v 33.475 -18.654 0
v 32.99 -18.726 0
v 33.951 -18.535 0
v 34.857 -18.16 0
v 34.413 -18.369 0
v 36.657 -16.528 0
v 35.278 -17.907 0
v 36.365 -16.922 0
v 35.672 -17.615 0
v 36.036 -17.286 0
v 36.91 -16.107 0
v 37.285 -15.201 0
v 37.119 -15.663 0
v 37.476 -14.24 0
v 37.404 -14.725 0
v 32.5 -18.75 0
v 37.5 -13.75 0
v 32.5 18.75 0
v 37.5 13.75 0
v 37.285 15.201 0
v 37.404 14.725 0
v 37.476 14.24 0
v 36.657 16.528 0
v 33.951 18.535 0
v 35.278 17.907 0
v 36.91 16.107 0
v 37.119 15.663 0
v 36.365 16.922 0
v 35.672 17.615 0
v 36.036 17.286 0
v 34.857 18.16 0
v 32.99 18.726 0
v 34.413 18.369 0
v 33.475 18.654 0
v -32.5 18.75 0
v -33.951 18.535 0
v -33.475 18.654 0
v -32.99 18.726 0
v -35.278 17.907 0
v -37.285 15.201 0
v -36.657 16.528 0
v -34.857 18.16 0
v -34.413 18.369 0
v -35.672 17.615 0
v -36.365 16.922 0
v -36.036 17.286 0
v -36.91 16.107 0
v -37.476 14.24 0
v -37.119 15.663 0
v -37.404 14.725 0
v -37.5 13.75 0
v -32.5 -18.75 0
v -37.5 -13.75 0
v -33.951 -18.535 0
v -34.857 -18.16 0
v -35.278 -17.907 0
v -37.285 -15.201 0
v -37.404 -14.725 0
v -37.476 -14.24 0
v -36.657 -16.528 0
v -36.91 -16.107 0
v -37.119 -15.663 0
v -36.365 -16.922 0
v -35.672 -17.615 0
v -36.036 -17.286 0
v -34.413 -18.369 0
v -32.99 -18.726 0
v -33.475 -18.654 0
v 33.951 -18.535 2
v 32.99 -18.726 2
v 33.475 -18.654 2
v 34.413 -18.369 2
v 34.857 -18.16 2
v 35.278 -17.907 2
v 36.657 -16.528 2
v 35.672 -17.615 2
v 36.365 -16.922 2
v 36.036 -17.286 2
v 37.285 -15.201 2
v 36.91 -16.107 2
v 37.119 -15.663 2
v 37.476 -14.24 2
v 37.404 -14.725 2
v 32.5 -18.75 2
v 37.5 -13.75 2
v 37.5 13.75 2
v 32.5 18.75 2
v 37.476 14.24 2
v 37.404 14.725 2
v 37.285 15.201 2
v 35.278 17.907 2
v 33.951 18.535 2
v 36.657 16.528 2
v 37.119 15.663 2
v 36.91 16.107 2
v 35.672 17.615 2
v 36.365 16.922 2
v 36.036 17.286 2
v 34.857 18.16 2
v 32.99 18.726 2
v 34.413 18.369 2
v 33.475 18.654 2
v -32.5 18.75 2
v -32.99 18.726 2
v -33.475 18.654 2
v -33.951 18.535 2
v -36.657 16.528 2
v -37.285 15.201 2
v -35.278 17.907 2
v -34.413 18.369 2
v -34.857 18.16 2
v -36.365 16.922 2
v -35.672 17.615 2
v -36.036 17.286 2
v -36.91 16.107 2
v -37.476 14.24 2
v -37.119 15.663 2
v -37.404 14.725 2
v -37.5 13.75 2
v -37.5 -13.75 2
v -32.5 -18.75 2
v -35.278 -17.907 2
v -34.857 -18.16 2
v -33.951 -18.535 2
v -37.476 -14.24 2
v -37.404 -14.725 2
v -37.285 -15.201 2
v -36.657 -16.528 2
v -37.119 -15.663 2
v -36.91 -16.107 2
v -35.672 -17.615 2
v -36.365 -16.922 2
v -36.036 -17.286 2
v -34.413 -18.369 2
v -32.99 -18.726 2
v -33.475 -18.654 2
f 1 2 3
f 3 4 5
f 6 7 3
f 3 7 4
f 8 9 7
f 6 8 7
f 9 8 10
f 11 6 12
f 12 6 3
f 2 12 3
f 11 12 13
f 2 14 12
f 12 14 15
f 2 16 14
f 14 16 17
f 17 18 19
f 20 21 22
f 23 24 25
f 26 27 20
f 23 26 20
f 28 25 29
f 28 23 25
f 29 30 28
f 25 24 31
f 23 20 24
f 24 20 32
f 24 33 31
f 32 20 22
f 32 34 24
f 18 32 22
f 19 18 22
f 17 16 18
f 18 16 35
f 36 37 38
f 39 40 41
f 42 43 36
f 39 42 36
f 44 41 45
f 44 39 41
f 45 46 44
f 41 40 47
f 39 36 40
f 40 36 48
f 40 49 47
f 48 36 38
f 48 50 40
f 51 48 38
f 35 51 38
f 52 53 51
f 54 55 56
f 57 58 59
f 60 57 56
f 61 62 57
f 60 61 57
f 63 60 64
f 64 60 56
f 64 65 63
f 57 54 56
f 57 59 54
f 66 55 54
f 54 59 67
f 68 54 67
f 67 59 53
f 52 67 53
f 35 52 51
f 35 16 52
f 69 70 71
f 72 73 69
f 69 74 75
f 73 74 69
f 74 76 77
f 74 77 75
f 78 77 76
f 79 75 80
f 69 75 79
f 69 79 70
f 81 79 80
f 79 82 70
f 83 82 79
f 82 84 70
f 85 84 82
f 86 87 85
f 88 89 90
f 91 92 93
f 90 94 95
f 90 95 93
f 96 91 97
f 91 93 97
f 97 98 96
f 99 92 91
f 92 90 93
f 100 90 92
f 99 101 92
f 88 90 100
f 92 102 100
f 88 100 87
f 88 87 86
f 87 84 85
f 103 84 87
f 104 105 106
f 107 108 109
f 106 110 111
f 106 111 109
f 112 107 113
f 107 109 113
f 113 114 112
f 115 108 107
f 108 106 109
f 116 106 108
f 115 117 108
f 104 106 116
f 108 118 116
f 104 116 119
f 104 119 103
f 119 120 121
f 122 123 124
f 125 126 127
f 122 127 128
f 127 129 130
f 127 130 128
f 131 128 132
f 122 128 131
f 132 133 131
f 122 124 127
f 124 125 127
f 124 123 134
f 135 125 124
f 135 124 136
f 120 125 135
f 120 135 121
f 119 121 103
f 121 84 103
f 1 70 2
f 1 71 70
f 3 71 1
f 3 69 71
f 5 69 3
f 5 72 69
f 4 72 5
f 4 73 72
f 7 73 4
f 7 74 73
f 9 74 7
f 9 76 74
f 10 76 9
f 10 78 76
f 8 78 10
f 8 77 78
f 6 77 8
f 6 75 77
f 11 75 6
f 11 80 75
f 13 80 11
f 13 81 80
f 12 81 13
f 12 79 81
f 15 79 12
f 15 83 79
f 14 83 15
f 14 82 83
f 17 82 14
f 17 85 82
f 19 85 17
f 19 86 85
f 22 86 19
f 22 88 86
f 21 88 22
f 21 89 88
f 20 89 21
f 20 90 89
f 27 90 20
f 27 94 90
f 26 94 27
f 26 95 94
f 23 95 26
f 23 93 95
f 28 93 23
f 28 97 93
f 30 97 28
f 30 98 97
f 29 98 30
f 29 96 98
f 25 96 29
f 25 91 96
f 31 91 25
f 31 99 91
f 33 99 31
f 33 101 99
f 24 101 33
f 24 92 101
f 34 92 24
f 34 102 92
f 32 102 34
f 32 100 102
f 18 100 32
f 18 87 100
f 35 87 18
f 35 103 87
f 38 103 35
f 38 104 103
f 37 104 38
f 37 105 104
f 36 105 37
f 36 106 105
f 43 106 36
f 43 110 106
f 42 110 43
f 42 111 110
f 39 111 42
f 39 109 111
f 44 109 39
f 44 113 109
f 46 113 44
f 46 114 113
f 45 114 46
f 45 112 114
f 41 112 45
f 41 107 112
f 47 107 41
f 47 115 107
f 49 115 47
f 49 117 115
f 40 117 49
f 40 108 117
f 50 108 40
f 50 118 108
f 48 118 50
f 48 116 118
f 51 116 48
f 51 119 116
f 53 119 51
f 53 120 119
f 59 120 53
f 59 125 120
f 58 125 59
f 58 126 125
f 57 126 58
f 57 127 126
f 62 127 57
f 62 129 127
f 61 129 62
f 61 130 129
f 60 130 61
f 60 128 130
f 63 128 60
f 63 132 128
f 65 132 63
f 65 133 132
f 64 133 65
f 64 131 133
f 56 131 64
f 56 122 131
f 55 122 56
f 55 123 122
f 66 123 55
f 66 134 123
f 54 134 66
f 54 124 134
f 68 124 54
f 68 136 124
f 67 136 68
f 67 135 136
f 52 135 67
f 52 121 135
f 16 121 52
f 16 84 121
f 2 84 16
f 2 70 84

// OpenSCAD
$fn = 64;

// Customizable parameters
width = 75;                 // [25:200] Overall landscape width or portrait height in mm
aspect_ratio = 2;           // [1:0.1:5] Width-to-height ratio
thickness = 2;              // [0.5:0.5:10] Substrate thickness in mm
border_radius = 5;          // [0:0.5:25] Corner radius in mm
orientation = "landscape";  // [landscape, portrait]

function substrate_plate_width(substrate_width, substrate_aspect_ratio, substrate_orientation) =
  substrate_orientation == "portrait"
    ? substrate_width / substrate_aspect_ratio
    : substrate_width;

function substrate_plate_height(substrate_width, substrate_aspect_ratio, substrate_orientation) =
  substrate_orientation == "portrait"
    ? substrate_width
    : substrate_width / substrate_aspect_ratio;

module rounded_rectangle_2d(rect_width, rect_height, radius) {
  bounded_radius = min(radius, min(rect_width, rect_height) / 2);

  if (bounded_radius <= 0) {
    square([rect_width, rect_height], center = true);
  } else {
    offset(r = bounded_radius) {
      square(
        [
          rect_width - (2 * bounded_radius),
          rect_height - (2 * bounded_radius),
        ],
        center = true
      );
    }
  }
}

module substrate(
  substrate_width = width,
  substrate_aspect_ratio = aspect_ratio,
  substrate_thickness = thickness,
  substrate_border_radius = border_radius,
  substrate_orientation = orientation
) {
  linear_extrude(height = substrate_thickness) {
    rounded_rectangle_2d(
      substrate_plate_width(
        substrate_width,
        substrate_aspect_ratio,
        substrate_orientation
      ),
      substrate_plate_height(
        substrate_width,
        substrate_aspect_ratio,
        substrate_orientation
      ),
      substrate_border_radius
    );
  }
}

substrate();
